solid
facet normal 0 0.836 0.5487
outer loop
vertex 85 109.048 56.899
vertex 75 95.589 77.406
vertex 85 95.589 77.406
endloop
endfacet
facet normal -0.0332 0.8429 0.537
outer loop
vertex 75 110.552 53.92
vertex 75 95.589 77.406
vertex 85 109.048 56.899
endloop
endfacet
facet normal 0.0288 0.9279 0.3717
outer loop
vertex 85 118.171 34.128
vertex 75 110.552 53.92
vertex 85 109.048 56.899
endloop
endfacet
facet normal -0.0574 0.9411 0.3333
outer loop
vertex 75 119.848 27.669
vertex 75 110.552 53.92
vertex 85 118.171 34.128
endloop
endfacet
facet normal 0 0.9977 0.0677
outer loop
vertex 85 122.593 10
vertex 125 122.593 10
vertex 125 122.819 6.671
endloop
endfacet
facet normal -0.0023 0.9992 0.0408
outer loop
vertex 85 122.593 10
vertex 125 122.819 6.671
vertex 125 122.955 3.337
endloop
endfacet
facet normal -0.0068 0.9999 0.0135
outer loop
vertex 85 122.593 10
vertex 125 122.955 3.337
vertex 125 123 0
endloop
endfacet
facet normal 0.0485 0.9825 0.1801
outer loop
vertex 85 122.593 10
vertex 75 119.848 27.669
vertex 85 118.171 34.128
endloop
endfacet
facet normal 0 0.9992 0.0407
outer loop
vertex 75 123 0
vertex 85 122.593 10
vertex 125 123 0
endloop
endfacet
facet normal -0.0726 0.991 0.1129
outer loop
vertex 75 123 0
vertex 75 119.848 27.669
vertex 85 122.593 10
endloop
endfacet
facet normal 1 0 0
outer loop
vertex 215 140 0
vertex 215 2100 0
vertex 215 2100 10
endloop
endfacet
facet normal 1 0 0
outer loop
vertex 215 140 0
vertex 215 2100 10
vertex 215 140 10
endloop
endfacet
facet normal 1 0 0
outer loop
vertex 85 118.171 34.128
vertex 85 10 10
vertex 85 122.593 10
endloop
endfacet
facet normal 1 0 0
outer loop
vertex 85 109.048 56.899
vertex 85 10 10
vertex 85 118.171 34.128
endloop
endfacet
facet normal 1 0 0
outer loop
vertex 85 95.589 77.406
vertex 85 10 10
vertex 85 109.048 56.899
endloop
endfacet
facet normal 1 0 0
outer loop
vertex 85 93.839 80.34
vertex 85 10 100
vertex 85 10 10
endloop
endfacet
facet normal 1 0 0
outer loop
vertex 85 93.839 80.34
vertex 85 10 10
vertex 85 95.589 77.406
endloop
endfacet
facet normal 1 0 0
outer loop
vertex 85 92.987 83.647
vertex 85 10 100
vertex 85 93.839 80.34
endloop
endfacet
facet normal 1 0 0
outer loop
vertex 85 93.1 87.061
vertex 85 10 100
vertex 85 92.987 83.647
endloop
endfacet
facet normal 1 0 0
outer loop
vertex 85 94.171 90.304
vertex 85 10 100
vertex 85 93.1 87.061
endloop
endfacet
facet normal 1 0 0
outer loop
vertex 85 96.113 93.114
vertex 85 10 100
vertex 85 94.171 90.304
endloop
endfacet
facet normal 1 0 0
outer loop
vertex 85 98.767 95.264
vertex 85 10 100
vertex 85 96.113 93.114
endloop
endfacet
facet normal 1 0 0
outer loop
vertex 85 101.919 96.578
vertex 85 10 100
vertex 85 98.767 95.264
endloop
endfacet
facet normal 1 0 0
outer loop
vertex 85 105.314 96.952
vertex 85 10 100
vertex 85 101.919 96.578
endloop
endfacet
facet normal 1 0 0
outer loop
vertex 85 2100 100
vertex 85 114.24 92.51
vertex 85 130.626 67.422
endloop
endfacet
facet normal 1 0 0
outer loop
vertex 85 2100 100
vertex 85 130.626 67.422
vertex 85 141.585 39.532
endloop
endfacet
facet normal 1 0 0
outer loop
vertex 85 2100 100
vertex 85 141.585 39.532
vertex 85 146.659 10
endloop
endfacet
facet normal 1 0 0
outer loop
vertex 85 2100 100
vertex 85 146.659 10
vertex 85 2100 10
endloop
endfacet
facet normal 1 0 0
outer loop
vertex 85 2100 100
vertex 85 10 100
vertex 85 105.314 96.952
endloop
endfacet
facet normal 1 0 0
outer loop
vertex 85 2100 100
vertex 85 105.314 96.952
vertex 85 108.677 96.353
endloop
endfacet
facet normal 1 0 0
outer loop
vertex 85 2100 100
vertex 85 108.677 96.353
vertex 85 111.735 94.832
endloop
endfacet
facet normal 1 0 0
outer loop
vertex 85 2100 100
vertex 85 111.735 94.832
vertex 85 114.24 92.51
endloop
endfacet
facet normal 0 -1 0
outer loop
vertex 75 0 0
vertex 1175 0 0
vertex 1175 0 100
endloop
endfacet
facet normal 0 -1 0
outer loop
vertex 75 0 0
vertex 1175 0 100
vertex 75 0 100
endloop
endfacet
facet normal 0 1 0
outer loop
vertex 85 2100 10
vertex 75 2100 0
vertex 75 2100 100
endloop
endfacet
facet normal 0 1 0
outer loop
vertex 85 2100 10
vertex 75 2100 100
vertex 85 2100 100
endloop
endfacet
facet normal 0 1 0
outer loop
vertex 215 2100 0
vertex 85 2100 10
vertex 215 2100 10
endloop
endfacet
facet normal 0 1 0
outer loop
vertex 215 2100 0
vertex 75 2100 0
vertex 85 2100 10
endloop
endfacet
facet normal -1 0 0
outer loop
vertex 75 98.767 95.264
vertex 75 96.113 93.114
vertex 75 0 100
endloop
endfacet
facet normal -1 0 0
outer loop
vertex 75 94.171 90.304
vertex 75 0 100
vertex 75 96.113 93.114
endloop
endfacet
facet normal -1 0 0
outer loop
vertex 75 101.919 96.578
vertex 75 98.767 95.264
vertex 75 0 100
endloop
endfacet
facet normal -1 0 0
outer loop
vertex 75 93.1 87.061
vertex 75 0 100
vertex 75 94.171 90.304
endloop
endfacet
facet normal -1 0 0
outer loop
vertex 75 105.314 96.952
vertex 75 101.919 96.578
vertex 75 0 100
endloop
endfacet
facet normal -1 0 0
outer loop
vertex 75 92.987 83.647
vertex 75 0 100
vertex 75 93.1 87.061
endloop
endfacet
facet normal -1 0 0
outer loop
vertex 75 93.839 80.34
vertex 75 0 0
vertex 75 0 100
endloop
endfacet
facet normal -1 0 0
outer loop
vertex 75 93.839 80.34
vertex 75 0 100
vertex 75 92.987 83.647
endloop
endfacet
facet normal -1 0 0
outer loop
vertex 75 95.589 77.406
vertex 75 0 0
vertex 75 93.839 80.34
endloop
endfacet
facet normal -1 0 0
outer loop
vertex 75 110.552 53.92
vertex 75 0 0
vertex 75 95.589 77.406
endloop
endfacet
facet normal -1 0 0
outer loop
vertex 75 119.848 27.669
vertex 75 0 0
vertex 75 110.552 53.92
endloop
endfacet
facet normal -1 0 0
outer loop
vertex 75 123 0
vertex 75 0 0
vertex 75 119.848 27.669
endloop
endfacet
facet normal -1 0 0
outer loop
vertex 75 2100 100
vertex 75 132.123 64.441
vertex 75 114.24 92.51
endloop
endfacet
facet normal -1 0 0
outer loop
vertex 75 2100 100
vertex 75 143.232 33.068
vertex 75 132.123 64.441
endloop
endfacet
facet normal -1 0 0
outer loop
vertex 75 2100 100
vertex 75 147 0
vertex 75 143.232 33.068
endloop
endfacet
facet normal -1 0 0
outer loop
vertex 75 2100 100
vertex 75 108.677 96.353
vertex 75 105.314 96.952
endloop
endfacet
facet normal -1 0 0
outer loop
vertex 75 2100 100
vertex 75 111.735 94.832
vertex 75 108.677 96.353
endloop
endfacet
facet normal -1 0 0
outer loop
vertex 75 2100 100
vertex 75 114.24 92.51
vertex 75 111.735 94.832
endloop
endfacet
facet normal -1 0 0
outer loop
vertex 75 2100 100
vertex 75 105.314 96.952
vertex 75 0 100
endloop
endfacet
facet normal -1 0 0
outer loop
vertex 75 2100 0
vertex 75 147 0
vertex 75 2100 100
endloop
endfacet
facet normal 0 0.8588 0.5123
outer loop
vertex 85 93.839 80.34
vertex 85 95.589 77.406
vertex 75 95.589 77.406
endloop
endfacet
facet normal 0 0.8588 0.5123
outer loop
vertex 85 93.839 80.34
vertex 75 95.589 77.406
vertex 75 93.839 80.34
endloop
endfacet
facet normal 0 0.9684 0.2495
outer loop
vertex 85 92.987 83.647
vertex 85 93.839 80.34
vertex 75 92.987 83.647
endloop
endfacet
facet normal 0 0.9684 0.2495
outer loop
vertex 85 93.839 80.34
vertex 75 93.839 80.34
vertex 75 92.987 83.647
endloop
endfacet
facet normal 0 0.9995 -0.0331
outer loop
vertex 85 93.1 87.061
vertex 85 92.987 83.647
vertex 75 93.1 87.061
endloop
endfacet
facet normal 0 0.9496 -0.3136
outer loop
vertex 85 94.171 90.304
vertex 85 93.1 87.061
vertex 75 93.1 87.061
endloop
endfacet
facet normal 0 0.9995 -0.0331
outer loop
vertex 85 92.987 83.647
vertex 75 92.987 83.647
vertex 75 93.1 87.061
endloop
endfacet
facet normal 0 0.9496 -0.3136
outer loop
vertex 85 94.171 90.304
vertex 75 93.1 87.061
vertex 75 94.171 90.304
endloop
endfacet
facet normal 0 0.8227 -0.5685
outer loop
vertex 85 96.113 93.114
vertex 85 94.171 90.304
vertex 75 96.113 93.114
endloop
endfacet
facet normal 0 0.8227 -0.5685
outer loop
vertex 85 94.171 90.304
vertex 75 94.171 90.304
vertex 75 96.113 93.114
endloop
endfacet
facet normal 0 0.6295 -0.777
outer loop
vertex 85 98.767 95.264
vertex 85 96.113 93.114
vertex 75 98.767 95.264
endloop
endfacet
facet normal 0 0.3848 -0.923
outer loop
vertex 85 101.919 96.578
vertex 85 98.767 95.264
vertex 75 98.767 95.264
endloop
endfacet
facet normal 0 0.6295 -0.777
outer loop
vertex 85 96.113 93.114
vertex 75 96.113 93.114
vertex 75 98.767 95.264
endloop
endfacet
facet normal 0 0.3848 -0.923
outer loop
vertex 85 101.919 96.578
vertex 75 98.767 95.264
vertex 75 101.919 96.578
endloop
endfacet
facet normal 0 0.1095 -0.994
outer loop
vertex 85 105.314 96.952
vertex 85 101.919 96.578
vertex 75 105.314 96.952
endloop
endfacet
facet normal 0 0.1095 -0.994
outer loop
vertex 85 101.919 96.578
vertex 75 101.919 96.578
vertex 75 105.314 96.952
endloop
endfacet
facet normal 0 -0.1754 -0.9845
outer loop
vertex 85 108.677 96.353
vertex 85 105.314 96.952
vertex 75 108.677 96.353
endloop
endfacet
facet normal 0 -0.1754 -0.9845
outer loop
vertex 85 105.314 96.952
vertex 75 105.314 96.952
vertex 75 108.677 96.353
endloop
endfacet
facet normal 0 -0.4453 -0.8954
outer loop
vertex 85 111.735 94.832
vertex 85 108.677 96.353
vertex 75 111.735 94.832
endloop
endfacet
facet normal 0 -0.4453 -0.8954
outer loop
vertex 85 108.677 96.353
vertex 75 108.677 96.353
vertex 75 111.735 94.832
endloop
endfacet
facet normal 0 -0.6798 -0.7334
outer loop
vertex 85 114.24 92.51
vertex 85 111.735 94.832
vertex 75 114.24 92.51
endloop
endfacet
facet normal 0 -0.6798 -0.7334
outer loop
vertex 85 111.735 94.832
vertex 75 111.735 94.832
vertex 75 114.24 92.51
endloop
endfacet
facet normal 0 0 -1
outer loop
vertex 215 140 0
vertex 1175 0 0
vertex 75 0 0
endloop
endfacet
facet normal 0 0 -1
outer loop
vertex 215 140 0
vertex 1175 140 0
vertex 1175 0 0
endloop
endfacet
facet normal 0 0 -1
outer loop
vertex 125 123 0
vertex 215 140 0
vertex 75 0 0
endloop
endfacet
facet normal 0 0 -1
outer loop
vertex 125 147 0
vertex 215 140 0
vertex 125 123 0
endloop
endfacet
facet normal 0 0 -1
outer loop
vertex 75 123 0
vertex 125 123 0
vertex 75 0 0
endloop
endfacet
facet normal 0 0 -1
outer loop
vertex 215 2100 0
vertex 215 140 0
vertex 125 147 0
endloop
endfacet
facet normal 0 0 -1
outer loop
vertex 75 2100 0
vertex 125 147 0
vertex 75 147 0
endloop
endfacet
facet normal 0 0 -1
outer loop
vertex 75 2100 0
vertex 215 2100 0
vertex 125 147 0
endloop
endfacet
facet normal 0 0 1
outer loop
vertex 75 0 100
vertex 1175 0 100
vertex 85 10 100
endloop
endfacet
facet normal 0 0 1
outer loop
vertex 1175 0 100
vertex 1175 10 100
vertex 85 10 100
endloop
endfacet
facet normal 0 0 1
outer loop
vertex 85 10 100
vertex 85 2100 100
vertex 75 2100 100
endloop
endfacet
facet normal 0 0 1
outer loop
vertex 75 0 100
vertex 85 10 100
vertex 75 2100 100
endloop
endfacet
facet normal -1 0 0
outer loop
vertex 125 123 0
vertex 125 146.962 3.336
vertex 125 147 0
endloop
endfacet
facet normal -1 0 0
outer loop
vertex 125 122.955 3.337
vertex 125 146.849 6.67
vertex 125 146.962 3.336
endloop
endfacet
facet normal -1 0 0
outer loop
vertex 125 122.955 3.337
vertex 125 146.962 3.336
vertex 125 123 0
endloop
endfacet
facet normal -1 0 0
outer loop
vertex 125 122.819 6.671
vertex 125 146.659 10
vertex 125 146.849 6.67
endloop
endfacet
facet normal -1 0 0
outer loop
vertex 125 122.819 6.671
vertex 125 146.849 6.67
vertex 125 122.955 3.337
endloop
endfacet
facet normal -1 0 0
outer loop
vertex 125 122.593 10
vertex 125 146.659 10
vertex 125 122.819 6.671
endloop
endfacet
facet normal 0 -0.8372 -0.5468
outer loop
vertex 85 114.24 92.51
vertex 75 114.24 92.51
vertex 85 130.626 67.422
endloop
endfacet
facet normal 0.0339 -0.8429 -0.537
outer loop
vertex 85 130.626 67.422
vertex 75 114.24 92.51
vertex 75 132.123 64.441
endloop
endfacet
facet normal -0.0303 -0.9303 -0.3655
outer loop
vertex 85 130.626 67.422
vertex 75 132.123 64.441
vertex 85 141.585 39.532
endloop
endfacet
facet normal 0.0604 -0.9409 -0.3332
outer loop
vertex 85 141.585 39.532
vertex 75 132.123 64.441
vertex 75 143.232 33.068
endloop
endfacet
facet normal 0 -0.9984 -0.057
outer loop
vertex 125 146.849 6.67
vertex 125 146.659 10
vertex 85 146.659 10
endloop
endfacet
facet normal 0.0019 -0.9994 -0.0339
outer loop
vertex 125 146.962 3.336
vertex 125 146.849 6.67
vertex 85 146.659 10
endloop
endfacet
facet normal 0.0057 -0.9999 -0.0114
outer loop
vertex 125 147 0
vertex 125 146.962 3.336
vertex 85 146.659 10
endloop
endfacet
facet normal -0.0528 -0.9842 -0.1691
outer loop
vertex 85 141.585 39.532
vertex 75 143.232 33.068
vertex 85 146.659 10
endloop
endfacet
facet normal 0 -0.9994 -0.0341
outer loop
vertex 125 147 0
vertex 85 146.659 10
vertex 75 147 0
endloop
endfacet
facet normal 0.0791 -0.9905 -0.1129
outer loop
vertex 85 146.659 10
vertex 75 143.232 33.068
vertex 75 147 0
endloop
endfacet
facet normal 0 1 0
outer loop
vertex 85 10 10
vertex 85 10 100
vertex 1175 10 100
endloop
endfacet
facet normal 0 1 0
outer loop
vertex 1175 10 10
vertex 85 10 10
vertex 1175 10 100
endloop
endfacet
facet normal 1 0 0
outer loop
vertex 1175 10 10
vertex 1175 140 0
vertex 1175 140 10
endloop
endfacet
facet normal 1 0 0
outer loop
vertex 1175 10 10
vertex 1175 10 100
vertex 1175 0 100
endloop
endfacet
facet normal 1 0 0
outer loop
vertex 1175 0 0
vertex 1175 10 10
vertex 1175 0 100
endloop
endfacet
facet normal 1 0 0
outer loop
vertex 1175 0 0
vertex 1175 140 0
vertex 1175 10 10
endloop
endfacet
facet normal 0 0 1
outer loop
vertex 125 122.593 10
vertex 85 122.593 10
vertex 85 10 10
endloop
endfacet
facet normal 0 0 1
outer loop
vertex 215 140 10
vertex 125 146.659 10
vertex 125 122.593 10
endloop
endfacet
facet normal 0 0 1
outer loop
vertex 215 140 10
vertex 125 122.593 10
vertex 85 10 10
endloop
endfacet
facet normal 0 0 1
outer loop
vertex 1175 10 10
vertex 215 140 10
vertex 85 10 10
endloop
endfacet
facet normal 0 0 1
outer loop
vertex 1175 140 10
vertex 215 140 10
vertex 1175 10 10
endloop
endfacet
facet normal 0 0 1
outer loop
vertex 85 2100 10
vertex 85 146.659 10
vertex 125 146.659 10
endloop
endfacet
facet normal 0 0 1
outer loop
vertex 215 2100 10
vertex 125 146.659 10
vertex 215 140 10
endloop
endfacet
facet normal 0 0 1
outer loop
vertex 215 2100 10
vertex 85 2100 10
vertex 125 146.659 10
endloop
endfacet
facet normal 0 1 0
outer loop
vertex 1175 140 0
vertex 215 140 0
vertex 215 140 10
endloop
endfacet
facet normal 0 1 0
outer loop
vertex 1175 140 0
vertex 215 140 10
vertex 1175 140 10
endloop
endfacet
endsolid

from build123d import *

# Parameters (mm, degrees)
PAD_DEPTH       = 100
SKETCH001_W     = 1090
SKETCH001_H     = 2090
POCKET_DEPTH    = 90
POCKET001_DEPTH = 50


with BuildPart() as part:
    # Sketch → Pad (new body)
    with BuildSketch(Plane.XY):
        Polygon((75, 0), (75, 2100), (215, 2100), (215, 140), (1175, 140), (1175, 0), align=None)
    extrude(amount=PAD_DEPTH)

    # Sketch001 (on Face8 of Pad) → Pocket (cut)
    with BuildSketch(Plane.XY.offset(100)):
        with Locations((630, 1055)):
            Rectangle(SKETCH001_W, SKETCH001_H)
    extrude(amount=-POCKET_DEPTH, mode=Mode.SUBTRACT)

    # Sketch002 (on Face1 of Pocket) → Pocket001 (cut)
    with BuildSketch(Plane(origin=(75, 0, 0), x_dir=(0, -1, 0), z_dir=(-1, 0, 0))):
        with BuildLine():
            ThreePointArc((-95.588953, 77.406408), (-97.362834, 94.284037), (-114.240456, 92.510097))
            ThreePointArc((-114.240456, 92.510097), (-138.568299, 49.069608), (-147, 0))
            Line((-147, 0), (-123, 0))
            ThreePointArc((-95.588953, 77.406408), (-115.944903, 41.058244), (-123, 0))
        make_face()
    extrude(amount=-POCKET001_DEPTH, mode=Mode.SUBTRACT)


solid = part.part
